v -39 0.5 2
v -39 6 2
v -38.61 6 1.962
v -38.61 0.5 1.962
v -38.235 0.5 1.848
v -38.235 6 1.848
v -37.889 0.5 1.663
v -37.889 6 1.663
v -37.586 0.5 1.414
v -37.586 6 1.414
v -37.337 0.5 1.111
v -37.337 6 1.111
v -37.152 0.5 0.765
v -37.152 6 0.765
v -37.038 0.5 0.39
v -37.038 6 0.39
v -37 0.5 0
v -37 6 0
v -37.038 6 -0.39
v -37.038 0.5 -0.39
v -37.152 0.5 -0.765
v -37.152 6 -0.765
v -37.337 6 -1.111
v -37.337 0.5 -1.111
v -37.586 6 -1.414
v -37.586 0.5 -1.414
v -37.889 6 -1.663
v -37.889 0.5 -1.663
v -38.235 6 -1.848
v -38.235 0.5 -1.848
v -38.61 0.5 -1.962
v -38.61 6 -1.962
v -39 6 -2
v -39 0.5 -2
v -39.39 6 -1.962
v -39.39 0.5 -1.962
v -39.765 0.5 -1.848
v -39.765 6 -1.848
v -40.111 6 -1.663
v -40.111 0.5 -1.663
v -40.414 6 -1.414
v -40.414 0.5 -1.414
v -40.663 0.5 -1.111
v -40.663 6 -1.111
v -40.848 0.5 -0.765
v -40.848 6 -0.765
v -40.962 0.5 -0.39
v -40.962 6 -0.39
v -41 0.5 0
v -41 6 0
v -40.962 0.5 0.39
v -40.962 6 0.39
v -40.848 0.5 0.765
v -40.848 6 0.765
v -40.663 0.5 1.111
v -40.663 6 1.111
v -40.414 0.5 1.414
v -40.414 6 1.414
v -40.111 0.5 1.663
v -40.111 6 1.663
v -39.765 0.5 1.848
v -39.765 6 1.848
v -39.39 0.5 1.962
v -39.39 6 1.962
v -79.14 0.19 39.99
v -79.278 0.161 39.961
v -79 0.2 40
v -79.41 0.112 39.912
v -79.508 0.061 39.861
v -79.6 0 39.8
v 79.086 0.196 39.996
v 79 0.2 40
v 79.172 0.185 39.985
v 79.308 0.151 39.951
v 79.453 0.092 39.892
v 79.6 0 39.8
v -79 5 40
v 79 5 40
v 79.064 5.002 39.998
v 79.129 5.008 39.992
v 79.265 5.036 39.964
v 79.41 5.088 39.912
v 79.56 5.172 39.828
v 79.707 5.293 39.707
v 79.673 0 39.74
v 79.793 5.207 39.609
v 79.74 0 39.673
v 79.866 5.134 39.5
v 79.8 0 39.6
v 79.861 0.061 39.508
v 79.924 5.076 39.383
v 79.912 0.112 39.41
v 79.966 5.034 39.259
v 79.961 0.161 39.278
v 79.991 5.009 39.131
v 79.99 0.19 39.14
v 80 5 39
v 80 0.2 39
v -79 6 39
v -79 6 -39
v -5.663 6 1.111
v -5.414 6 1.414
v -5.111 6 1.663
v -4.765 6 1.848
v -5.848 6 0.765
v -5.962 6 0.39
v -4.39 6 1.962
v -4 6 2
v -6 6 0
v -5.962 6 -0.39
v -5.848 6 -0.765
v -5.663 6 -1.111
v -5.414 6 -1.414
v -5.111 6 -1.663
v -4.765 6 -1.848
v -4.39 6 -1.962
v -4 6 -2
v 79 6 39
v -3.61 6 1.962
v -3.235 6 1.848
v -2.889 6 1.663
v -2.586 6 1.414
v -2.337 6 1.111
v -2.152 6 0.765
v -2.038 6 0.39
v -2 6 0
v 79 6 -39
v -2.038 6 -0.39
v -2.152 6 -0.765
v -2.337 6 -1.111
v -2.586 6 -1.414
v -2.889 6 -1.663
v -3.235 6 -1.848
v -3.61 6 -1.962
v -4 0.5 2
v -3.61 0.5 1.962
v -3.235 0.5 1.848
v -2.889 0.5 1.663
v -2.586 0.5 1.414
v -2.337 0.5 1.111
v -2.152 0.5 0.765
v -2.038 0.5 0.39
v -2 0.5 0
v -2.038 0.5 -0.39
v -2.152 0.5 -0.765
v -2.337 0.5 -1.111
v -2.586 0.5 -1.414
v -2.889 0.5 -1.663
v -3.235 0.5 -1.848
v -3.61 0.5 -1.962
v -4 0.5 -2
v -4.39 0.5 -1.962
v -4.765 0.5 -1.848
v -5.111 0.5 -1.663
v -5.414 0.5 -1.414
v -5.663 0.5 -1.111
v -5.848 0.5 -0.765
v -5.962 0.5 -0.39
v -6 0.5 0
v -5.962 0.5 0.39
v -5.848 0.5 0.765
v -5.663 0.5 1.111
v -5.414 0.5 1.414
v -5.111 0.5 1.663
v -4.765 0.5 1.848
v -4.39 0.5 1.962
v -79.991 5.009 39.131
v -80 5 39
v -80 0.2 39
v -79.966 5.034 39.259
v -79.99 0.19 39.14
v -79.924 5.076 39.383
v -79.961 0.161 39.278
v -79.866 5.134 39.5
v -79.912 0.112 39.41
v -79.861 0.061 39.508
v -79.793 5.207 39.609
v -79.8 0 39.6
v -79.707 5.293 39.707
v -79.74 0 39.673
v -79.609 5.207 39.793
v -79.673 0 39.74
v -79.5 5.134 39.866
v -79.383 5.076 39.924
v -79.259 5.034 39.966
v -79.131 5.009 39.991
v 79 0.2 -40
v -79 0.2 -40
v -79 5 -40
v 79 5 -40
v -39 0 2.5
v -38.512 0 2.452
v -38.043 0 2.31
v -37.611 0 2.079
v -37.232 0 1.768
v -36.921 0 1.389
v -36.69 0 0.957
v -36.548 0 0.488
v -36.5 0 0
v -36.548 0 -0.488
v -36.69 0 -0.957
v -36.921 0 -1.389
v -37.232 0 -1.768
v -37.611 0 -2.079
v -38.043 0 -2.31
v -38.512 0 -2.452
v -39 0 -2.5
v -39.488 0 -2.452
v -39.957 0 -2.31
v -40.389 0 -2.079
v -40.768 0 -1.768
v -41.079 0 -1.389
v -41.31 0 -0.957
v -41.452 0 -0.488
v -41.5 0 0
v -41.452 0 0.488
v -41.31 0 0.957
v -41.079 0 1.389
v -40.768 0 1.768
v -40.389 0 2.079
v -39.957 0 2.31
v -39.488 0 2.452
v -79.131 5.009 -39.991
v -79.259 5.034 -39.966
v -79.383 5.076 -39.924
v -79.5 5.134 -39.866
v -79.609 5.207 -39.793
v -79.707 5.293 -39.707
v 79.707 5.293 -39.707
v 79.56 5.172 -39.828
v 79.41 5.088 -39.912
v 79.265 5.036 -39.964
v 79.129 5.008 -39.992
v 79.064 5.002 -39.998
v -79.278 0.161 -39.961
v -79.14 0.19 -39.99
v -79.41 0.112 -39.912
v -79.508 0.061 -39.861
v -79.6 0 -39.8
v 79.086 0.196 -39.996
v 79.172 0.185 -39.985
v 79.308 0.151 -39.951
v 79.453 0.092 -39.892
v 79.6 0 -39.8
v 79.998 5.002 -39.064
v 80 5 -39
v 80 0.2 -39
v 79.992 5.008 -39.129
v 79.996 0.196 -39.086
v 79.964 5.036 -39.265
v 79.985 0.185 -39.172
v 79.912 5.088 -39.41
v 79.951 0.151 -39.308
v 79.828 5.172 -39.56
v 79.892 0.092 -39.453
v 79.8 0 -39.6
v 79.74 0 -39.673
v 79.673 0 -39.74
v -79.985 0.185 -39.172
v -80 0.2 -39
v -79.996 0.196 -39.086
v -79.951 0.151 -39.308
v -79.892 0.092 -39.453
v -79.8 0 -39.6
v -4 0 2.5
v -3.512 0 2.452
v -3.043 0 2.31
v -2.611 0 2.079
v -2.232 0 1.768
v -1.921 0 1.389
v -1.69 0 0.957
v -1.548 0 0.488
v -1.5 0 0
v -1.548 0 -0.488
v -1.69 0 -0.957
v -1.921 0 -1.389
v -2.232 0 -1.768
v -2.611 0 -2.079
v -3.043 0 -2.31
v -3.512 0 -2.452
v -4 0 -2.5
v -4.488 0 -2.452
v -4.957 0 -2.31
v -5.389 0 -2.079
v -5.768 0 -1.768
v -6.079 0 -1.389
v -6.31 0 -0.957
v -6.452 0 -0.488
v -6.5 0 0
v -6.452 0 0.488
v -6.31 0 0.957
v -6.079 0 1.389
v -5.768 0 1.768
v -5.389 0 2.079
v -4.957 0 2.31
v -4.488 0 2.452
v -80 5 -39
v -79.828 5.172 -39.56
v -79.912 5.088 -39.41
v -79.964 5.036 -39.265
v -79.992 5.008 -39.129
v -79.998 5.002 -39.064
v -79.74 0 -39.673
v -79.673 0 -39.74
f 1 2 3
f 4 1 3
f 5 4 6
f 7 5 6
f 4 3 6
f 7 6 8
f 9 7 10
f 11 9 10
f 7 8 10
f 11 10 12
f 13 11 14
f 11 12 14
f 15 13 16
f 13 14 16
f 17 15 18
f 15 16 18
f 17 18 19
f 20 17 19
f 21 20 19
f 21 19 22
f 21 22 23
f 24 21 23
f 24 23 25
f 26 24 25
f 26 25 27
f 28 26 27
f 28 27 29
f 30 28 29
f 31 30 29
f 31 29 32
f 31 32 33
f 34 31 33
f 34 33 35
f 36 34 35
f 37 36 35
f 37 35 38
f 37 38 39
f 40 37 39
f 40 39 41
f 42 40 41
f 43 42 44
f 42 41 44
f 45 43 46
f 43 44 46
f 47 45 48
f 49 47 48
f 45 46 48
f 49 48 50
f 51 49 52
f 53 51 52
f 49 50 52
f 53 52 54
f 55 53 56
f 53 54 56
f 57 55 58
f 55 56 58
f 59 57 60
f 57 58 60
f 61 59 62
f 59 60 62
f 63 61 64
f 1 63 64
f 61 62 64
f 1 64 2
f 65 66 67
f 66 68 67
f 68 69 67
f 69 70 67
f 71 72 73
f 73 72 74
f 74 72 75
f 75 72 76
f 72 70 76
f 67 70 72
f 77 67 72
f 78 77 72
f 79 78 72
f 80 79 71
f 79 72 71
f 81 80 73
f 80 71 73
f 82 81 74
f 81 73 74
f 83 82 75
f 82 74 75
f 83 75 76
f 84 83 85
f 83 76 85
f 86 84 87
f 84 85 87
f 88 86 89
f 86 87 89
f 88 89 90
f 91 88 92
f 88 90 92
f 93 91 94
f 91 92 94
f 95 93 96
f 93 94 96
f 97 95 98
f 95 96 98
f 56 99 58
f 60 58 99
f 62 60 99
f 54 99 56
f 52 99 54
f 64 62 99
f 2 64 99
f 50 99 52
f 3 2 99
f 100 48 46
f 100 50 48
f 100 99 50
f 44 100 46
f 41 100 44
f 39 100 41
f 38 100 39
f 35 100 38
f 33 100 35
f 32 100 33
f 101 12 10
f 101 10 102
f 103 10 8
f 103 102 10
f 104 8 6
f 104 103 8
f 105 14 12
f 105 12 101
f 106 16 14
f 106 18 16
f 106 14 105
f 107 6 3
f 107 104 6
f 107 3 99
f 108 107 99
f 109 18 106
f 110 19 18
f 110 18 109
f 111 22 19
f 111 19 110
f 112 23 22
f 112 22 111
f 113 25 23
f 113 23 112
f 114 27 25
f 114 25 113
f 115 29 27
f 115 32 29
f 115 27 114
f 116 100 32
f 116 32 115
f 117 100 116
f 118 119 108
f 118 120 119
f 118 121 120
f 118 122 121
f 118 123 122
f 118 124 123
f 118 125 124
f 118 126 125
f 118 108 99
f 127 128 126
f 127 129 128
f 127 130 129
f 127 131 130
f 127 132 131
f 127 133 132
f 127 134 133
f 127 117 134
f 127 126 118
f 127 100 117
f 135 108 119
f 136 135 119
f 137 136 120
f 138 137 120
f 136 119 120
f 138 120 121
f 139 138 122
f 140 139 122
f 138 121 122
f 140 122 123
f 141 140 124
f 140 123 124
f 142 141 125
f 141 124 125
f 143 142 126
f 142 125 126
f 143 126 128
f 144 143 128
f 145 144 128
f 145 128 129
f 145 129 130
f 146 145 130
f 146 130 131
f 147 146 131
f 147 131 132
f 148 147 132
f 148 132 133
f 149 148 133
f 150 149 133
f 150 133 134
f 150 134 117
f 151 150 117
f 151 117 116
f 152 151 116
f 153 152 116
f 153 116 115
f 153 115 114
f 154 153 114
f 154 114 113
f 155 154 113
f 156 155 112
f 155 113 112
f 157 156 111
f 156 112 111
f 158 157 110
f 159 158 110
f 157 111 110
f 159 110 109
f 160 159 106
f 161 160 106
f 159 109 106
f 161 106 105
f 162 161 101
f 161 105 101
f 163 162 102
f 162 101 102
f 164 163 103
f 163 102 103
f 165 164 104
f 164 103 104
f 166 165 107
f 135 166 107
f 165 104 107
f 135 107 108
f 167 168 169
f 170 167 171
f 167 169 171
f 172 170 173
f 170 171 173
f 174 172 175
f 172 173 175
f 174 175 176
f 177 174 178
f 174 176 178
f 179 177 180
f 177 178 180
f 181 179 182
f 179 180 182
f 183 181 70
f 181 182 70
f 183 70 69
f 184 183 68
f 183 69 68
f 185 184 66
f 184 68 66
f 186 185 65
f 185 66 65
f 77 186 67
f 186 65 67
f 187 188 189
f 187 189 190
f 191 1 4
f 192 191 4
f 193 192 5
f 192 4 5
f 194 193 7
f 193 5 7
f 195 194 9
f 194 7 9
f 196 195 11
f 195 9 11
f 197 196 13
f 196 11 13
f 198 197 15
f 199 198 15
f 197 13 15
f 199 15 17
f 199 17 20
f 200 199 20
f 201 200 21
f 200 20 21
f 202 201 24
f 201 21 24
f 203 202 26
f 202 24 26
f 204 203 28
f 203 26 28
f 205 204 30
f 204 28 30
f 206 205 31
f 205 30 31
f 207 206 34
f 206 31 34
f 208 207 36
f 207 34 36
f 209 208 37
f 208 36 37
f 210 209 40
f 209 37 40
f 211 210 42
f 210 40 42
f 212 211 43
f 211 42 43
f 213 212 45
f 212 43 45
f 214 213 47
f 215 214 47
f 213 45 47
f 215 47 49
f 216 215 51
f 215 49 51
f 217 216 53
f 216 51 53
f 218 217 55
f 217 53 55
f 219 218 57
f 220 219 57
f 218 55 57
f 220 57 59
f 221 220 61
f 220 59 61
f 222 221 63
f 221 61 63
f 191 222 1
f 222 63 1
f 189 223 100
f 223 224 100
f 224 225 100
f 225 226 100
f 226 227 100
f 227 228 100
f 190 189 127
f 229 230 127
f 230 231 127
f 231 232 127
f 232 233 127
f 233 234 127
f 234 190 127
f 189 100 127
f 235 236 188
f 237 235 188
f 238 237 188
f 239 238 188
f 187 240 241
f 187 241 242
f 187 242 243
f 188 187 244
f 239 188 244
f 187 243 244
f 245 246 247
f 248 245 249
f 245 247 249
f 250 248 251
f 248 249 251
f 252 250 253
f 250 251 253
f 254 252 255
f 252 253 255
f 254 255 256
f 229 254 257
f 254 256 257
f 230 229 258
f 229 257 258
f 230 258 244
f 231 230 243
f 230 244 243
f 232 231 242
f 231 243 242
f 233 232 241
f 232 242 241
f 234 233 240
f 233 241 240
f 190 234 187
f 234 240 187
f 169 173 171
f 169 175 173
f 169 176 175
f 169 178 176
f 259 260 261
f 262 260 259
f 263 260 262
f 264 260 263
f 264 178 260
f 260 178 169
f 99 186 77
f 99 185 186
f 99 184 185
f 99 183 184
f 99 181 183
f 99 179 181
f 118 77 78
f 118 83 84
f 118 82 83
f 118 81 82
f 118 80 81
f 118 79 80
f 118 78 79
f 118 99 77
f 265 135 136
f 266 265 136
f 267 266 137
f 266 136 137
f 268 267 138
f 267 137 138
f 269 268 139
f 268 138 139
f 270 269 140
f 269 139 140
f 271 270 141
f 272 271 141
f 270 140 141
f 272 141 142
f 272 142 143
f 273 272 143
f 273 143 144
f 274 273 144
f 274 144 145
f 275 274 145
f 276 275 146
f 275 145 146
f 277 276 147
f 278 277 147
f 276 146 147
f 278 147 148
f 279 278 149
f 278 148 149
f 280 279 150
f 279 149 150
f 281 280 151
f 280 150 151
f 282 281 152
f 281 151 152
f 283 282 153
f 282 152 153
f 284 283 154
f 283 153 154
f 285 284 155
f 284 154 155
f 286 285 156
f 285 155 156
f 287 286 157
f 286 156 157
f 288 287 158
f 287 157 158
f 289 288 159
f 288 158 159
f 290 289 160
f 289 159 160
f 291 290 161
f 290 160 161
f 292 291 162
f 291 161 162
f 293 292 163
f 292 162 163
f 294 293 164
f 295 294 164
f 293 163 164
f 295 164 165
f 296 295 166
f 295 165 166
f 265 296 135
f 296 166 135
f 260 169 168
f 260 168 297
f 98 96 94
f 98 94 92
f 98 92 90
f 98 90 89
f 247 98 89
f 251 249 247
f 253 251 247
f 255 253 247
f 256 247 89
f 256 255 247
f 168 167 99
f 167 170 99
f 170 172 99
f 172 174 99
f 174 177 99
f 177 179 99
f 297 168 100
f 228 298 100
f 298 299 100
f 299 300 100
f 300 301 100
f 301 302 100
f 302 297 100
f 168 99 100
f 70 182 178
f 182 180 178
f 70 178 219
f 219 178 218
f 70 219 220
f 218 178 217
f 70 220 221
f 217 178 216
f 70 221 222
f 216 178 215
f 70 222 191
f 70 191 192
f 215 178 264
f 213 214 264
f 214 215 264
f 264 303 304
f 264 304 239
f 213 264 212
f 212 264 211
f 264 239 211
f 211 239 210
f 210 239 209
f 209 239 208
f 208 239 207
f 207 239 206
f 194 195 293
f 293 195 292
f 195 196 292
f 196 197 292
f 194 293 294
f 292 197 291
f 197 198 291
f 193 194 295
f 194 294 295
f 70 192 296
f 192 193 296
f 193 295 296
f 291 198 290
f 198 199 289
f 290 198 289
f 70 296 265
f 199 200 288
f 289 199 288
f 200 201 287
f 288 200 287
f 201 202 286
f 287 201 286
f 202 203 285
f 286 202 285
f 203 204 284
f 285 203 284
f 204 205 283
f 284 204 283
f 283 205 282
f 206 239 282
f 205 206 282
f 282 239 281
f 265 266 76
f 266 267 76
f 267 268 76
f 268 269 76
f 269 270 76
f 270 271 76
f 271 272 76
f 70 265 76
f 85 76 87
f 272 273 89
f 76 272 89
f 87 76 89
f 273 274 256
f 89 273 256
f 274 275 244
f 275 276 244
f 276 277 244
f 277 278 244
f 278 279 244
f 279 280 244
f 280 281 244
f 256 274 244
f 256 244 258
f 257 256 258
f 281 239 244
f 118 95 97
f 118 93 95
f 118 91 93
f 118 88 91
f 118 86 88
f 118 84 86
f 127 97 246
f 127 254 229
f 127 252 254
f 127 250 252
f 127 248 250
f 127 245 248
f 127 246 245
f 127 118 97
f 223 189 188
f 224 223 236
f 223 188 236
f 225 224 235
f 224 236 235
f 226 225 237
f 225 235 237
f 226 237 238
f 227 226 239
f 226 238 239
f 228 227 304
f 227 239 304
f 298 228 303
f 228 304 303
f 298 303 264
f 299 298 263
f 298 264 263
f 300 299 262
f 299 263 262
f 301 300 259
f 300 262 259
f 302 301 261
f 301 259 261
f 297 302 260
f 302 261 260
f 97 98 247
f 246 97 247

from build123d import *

# Parameters (mm, degrees)
SKETCH_1_W          = 160
SKETCH_1_H          = 80
EXTRUDE_1_DEPTH     = 6
CHAMFER_1_SIZE      = 1
CHAMFER_2_SIZE      = 0.2
SKETCH_3_R          = 2
CUT_EXTRUDE_2_DEPTH = 90.643739324
CHAMFER_4_SIZE      = 0.5
FILLET_1_R          = 1


with BuildPart() as part:
    # 草图1 → 凸台-拉伸1 (new body)
    with BuildSketch(Plane(origin=(0, 0, 0), x_dir=(1, 0, 0), z_dir=(0, 1, 0))):
        Rectangle(SKETCH_1_W, SKETCH_1_H)
    extrude(amount=EXTRUDE_1_DEPTH)

    # 倒角1
    chamfer_1_edges = [part.edges().sort_by_distance(p)[0] for p in [
        (80, 6, 0),
        (0, 6, -40),
        (-80, 6, 0),
        (0, 6, 40),
    ]]
    chamfer(chamfer_1_edges, length=CHAMFER_1_SIZE)

    # 倒角2
    chamfer_2_edges = [part.edges().sort_by_distance(p)[0] for p in [
        (0, 0, -40),
        (80, 0, 0),
        (0, 0, 40),
        (-80, 0, 0),
    ]]
    chamfer(chamfer_2_edges, length=CHAMFER_2_SIZE)

    # 草图3 → 切除-拉伸2 (cut, through all)
    with BuildSketch(Plane(origin=(0, 6, 0), x_dir=(1, 0, 0), z_dir=(0, 1, 0))):
        with Locations(Location((-39, 0, 0), (0, 0, 270))):
            Circle(SKETCH_3_R)
        with Locations(Location((-4, 0, 0), (0, 0, 270))):
            Circle(SKETCH_3_R)
    extrude(amount=-CUT_EXTRUDE_2_DEPTH, mode=Mode.SUBTRACT)

    # 倒角4
    chamfer_4_edges = [part.edges().sort_by_distance(p)[0] for p in [
        (-39, 0, -2),
        (-4, 0, -2),
    ]]
    chamfer(chamfer_4_edges, length=CHAMFER_4_SIZE)

    # 圆角1
    # the kernel refuses this fillet: 1 mm, written as the material it takes off along each edge
    with BuildSketch(Plane(origin=(-80, -2.3, -40), x_dir=(1, 0, 0), z_dir=(0, 1, 0)), Plane(origin=(-80, -2.3, 40), x_dir=(0, 0, -1), z_dir=(0, 1, 0))) as fillet_1_piece_1:
        with BuildLine():
            CenterArc((FILLET_1_R, -FILLET_1_R), FILLET_1_R, 90, 90)
            Line((0, -FILLET_1_R), (0, 0))
            Line((0, 0), (FILLET_1_R, 0))
        make_face()
    extrude(amount=9.8, mode=Mode.SUBTRACT)
    with BuildSketch(Plane(origin=(80, -2.3, -40), x_dir=(-1, 0, 0), z_dir=(0, 1, 0)), Plane(origin=(80, -2.3, 40), x_dir=(0, 0, -1), z_dir=(0, 1, 0))) as fillet_1_piece_2:
        with BuildLine():
            CenterArc((FILLET_1_R, FILLET_1_R), FILLET_1_R, 180, 90)
            Line((0, FILLET_1_R), (0, 0))
            Line((0, 0), (FILLET_1_R, 0))
        make_face()
    extrude(amount=9.8, mode=Mode.SUBTRACT)


solid = part.part
